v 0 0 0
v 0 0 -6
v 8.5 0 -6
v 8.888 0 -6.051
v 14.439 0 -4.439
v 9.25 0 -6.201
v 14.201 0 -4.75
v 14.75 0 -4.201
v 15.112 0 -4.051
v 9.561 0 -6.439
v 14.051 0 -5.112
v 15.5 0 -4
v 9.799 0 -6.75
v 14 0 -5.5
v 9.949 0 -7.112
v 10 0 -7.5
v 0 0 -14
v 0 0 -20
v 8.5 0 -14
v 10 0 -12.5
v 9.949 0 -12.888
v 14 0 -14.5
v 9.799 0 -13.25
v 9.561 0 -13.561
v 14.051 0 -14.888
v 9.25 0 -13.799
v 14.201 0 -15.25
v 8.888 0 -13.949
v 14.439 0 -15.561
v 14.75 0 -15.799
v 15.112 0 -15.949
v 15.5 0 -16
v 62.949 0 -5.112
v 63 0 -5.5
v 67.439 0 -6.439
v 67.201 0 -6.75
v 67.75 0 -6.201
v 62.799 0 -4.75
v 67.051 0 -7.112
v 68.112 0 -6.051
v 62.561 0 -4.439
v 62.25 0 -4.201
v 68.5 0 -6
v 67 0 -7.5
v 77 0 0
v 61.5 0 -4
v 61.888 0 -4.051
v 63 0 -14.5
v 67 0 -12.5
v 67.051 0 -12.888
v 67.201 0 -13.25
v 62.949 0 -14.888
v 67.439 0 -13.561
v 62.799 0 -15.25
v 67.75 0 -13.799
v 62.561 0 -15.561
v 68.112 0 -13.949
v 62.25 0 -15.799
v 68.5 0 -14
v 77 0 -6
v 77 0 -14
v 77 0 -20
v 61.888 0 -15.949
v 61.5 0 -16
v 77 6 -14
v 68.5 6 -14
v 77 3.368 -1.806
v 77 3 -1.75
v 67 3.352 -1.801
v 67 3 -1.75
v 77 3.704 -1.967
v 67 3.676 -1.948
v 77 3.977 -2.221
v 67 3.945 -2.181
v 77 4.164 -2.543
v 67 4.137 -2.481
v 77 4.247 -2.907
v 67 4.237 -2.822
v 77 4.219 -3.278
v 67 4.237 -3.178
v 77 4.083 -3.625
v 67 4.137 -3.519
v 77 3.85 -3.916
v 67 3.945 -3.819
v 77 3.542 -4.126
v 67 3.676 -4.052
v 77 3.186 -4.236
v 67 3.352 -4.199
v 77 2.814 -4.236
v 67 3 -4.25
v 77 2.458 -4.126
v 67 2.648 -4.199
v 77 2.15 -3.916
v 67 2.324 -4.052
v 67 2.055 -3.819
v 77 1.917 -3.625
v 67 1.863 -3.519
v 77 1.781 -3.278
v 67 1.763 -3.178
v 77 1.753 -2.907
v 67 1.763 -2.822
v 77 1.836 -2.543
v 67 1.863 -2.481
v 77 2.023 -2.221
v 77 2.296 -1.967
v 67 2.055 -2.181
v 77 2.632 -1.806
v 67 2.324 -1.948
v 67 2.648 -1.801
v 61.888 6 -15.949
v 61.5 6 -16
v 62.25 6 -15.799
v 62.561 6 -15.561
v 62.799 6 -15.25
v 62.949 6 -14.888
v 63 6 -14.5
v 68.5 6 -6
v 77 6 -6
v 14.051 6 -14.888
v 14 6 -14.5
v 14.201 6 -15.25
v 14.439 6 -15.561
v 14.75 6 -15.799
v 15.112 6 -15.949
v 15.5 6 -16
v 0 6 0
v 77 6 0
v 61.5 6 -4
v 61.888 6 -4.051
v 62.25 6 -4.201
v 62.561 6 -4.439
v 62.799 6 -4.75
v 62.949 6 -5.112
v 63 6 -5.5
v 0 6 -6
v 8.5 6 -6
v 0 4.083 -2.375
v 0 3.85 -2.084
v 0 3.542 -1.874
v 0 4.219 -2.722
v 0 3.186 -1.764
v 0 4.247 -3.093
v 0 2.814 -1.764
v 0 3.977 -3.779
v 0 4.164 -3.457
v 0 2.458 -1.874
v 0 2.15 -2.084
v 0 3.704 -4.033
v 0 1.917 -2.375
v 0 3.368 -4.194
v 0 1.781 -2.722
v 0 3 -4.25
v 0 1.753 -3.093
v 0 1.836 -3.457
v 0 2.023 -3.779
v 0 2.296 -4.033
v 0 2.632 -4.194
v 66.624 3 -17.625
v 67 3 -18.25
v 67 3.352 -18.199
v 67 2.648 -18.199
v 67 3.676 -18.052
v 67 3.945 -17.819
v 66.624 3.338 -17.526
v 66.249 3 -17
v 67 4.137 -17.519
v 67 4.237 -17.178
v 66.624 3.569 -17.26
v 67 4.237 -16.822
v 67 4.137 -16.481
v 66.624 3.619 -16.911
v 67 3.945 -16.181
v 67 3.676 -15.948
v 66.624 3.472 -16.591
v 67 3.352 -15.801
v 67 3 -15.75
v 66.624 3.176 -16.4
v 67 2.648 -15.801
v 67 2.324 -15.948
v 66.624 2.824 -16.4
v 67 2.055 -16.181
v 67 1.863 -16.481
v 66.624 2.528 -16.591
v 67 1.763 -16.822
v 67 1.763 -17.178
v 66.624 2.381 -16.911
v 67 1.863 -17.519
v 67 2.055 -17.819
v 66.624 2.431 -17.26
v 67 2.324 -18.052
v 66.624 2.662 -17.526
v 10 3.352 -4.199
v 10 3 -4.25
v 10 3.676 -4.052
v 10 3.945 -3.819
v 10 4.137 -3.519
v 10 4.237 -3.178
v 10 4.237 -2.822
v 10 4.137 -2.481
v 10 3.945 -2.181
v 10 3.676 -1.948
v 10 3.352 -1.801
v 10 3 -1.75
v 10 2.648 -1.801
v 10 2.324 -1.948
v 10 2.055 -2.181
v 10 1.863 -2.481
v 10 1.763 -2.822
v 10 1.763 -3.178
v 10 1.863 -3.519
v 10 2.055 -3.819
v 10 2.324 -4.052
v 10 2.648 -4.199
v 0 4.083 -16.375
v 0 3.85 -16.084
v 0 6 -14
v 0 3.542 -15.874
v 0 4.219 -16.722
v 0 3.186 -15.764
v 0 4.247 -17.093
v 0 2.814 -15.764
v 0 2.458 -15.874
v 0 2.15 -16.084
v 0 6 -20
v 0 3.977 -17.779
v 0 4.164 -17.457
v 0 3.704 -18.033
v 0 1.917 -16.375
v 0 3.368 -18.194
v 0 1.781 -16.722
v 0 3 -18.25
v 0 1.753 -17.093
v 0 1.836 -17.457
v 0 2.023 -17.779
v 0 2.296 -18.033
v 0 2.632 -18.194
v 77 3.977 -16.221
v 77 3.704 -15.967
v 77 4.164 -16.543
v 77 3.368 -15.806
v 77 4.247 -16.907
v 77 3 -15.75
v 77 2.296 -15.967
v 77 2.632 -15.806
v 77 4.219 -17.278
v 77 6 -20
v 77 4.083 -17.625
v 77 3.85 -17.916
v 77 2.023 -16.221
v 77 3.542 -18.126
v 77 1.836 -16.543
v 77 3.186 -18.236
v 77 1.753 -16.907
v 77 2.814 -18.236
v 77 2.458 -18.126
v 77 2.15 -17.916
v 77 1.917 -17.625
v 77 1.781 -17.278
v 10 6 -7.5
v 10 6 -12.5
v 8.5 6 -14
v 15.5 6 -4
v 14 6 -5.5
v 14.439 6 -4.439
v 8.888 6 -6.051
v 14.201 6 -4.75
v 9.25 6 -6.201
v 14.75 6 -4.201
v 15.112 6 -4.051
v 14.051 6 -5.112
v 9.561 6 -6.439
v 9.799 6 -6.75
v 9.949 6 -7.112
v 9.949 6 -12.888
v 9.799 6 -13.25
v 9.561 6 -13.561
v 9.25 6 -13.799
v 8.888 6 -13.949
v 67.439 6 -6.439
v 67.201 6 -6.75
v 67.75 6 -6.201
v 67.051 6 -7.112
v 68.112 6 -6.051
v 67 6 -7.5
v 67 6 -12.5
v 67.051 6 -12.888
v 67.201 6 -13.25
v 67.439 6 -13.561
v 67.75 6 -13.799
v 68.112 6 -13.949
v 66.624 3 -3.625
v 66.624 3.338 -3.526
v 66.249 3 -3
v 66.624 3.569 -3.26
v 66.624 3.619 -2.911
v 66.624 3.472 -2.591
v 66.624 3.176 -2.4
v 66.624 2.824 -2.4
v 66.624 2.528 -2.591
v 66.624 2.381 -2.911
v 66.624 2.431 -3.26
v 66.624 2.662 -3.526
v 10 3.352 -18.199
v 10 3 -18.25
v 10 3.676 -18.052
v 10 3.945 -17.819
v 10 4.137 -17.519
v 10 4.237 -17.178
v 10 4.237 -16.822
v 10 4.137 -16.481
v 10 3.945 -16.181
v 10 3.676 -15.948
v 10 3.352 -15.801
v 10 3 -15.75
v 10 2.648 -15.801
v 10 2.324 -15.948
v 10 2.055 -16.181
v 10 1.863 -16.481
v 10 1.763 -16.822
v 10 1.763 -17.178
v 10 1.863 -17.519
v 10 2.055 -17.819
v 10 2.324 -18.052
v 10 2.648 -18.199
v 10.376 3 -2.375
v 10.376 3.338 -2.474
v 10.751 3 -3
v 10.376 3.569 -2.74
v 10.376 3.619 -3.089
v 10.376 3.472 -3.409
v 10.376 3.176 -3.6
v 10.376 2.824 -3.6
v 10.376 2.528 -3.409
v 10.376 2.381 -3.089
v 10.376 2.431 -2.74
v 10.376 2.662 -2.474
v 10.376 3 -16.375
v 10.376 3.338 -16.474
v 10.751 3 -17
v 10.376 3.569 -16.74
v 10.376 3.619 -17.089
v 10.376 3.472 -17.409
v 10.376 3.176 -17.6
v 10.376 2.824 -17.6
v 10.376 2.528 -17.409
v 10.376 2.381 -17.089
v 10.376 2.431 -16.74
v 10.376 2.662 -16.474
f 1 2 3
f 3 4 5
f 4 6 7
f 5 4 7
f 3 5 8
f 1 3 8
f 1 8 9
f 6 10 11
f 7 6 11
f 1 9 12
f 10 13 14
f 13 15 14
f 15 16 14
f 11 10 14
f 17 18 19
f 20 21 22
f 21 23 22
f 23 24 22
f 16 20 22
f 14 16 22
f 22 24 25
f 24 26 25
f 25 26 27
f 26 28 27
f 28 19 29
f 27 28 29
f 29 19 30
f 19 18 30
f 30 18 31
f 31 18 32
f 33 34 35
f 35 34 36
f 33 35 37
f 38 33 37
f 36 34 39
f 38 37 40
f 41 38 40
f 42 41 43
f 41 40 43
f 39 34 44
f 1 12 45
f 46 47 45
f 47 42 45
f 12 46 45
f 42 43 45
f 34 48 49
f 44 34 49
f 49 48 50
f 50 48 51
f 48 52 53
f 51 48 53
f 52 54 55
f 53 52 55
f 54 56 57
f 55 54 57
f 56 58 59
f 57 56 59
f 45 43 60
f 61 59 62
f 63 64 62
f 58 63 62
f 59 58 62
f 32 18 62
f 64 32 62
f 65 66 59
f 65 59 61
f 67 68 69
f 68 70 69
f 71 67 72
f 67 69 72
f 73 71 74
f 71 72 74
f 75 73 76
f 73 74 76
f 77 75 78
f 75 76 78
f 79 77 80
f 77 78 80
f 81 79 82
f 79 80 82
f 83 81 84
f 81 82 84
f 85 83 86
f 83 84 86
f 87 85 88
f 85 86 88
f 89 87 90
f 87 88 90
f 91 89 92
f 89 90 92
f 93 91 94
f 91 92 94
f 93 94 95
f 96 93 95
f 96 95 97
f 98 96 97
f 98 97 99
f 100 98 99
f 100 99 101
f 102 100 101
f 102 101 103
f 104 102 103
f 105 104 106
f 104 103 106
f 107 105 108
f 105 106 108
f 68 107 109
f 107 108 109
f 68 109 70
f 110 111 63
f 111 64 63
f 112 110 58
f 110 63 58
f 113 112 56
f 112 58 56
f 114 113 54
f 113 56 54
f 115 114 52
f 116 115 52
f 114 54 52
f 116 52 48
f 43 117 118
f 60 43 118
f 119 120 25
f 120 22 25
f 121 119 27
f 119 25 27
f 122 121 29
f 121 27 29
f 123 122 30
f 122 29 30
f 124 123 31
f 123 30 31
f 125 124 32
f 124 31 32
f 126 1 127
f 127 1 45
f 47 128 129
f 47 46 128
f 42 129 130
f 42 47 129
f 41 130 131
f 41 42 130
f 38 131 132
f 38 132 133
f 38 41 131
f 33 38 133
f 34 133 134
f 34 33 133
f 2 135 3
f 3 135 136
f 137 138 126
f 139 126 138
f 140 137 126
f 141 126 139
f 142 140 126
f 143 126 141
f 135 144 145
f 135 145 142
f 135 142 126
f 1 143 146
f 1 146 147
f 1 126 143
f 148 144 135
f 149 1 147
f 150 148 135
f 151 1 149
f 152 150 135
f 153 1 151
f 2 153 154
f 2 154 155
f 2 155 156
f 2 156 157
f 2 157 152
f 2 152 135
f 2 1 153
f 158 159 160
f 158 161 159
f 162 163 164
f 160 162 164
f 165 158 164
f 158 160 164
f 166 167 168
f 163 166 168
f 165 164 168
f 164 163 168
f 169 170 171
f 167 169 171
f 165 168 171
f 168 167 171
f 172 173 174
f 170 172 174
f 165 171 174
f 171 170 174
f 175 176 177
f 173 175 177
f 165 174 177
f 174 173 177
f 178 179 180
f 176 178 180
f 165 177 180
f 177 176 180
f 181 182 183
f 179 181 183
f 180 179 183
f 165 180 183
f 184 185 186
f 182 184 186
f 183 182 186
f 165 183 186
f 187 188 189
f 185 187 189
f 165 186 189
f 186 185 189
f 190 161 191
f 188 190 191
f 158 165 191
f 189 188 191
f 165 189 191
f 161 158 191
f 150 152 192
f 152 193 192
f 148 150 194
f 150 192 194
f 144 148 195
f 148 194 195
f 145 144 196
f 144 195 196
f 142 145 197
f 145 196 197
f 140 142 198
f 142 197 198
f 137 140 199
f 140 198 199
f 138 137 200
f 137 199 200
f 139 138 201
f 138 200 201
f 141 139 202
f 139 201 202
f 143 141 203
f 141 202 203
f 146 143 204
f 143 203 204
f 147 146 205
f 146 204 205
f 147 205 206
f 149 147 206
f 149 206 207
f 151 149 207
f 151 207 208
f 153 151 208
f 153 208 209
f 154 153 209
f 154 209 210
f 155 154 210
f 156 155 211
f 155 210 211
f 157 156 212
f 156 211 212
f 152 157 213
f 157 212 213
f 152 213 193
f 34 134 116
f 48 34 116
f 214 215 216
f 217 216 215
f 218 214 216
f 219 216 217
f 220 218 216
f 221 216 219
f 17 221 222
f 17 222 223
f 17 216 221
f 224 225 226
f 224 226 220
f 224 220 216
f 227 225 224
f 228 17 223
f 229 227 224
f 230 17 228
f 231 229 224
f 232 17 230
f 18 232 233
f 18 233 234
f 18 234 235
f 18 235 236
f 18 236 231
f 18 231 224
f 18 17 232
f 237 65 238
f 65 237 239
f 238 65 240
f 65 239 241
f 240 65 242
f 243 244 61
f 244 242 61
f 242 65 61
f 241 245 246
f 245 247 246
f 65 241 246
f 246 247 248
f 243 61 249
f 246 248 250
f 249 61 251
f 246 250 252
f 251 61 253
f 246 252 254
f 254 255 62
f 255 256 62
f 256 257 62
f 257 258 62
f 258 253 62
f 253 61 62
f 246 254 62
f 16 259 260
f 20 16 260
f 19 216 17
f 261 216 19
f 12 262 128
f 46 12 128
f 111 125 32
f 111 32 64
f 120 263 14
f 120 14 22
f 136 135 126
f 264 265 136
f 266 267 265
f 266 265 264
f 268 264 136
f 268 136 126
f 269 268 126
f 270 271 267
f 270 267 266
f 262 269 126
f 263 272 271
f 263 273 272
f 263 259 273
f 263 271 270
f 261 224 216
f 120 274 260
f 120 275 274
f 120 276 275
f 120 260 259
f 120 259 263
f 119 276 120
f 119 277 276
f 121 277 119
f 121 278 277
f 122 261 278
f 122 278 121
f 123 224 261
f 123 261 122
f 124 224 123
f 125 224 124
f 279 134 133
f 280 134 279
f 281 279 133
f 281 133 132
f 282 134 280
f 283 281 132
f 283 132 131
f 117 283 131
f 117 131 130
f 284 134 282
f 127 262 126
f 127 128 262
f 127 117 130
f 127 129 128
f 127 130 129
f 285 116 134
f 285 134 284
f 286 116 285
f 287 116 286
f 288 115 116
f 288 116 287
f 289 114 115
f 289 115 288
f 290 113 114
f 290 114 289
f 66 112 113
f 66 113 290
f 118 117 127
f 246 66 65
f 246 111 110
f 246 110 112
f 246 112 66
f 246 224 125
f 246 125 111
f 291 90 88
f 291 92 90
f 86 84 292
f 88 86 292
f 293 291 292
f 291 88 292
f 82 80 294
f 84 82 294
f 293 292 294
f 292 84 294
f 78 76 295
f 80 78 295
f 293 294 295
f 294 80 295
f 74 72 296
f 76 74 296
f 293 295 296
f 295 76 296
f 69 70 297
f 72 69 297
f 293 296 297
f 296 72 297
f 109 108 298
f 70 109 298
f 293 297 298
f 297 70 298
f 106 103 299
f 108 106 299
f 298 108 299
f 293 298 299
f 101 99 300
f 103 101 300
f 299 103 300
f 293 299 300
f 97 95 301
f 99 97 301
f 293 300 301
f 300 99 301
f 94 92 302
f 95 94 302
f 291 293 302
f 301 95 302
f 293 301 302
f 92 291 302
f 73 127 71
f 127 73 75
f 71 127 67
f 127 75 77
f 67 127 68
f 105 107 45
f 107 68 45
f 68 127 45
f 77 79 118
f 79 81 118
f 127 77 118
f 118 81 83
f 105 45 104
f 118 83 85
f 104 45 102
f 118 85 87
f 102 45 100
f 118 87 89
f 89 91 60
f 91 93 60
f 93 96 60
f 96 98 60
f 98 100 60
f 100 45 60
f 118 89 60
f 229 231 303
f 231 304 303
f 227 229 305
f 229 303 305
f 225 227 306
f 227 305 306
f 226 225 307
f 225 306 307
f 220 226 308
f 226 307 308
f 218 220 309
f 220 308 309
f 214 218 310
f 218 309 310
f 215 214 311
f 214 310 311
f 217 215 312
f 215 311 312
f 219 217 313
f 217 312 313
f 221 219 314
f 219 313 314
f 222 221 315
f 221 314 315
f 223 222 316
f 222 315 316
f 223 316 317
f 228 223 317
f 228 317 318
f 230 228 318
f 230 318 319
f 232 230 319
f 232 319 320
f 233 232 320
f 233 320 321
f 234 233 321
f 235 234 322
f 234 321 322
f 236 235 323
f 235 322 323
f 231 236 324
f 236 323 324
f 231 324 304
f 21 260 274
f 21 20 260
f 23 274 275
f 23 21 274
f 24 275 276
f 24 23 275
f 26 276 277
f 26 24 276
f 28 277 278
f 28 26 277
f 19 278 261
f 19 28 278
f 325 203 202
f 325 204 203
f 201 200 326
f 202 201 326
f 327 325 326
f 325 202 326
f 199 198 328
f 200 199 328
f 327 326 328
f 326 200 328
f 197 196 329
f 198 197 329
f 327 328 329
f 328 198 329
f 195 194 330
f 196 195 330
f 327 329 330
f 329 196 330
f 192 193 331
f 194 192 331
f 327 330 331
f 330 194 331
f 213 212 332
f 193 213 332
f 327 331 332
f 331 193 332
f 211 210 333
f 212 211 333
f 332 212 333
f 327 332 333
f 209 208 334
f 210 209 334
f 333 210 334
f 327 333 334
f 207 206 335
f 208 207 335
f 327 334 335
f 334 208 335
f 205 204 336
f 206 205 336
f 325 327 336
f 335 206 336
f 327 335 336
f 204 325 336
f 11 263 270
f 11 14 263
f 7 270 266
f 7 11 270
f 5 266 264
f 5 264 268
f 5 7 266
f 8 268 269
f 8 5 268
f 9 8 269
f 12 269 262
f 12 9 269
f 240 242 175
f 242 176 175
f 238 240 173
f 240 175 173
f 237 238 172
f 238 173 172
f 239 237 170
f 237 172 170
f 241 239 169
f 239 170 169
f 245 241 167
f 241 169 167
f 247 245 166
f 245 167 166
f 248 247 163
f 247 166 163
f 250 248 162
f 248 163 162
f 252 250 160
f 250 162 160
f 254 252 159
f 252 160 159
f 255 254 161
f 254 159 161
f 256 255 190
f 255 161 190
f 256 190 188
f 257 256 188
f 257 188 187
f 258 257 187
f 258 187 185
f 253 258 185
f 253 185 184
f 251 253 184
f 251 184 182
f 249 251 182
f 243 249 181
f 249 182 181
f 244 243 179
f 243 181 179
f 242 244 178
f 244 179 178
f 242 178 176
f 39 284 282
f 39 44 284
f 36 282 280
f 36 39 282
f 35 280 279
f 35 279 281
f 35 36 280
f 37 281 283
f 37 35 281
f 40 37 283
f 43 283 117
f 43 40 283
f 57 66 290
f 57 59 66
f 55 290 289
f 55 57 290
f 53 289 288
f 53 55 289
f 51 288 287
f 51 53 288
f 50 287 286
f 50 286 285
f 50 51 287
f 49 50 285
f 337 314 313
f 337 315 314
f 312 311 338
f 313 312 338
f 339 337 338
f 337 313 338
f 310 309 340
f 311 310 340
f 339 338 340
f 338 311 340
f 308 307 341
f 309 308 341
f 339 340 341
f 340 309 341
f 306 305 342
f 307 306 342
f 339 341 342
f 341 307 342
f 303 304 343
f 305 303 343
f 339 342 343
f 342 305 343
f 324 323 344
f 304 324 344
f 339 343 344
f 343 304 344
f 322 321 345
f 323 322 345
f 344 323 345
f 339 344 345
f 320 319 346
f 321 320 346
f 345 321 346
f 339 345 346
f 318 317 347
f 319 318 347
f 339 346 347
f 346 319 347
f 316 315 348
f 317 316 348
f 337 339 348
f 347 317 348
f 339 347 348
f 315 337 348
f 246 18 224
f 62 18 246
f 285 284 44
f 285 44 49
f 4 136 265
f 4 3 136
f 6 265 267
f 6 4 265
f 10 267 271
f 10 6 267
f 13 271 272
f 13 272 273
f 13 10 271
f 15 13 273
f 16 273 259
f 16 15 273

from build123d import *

# Parameters (mm, degrees)
SKETCH1_W                   = 77
SKETCH1_H                   = 20
BOSS_EXTRUDE1_DEPTH         = 6
TAP_DRILL_FOR_M3_TAP1_D     = 2.5
TAP_DRILL_FOR_M3_TAP1_DEPTH = 10
TAP_DRILL_FOR_M3_TAP1_TIP   = 0.751075774
TAP_DRILL_FOR_M3_TAP2_D     = 2.5
TAP_DRILL_FOR_M3_TAP2_DEPTH = 10
TAP_DRILL_FOR_M3_TAP2_TIP   = 0.751075774
CUT_EXTRUDE1_REACH          = 81.781
SKETCH7_W                   = 10
SKETCH7_H                   = 8
SKETCH7_W_2                 = 49
SKETCH7_H_2                 = 12
FILLET1_R                   = 1.5


with BuildPart() as part:
    # Sketch1 → Boss-Extrude1 (new body)
    with BuildSketch(Plane(origin=(0, 0, 0), x_dir=(1, 0, 0), z_dir=(0, 1, 0))):
        with Locations((38.5, 10)):
            Rectangle(SKETCH1_W, SKETCH1_H)
    extrude(amount=BOSS_EXTRUDE1_DEPTH)

    # Tap Drill for M3 Tap1
    with Locations(Plane.ZY):
        with Locations((-17, 3), (-3, 3)):
            Hole(TAP_DRILL_FOR_M3_TAP1_D / 2, depth=TAP_DRILL_FOR_M3_TAP1_DEPTH)
            with Locations((0, 0, -(TAP_DRILL_FOR_M3_TAP1_DEPTH + TAP_DRILL_FOR_M3_TAP1_TIP / 2))):  # 118° drill point
                Cone(0, TAP_DRILL_FOR_M3_TAP1_D / 2, TAP_DRILL_FOR_M3_TAP1_TIP, mode=Mode.SUBTRACT)

    # Tap Drill for M3 Tap2
    with Locations(Plane(origin=(77, 0, 0), x_dir=(0, 0, -1), z_dir=(1, 0, 0))):
        with Locations((3, 3), (17, 3)):
            Hole(TAP_DRILL_FOR_M3_TAP2_D / 2, depth=TAP_DRILL_FOR_M3_TAP2_DEPTH)
            with Locations((0, 0, -(TAP_DRILL_FOR_M3_TAP2_DEPTH + TAP_DRILL_FOR_M3_TAP2_TIP / 2))):  # 118° drill point
                Cone(0, TAP_DRILL_FOR_M3_TAP2_D / 2, TAP_DRILL_FOR_M3_TAP2_TIP, mode=Mode.SUBTRACT)

    # Sketch7 → Cut-Extrude1 (cut, up to next)
    with BuildSketch(Plane(origin=(0, 6, 0), x_dir=(1, 0, 0), z_dir=(0, 1, 0)), mode=Mode.PRIVATE) as cut_extrude1_sk1:
        with Locations((5, 10)):
            Rectangle(SKETCH7_W, SKETCH7_H)
    cut_extrude1_tool1 = extrude(cut_extrude1_sk1.sketch, amount=-CUT_EXTRUDE1_REACH, mode=Mode.PRIVATE) & part.part
    # Sketch7 → Cut-Extrude1 (cut, up to next)
    with BuildSketch(Plane(origin=(0, 6, 0), x_dir=(1, 0, 0), z_dir=(0, 1, 0)), mode=Mode.PRIVATE) as cut_extrude1_sk2:
        with Locations((38.5, 10)):
            Rectangle(SKETCH7_W_2, SKETCH7_H_2)
    cut_extrude1_tool2 = extrude(cut_extrude1_sk2.sketch, amount=-CUT_EXTRUDE1_REACH, mode=Mode.PRIVATE) & part.part
    # Sketch7 → Cut-Extrude1 (cut, up to next)
    with BuildSketch(Plane(origin=(0, 6, 0), x_dir=(1, 0, 0), z_dir=(0, 1, 0)), mode=Mode.PRIVATE) as cut_extrude1_sk3:
        with Locations((72, 10)):
            Rectangle(SKETCH7_W, SKETCH7_H)
    cut_extrude1_tool3 = extrude(cut_extrude1_sk3.sketch, amount=-CUT_EXTRUDE1_REACH, mode=Mode.PRIVATE) & part.part
    add(cut_extrude1_tool1.solids().sort_by_distance((5, 6, -10))[0], mode=Mode.SUBTRACT)
    add(cut_extrude1_tool2.solids().sort_by_distance((38.5, 6, -10))[0], mode=Mode.SUBTRACT)
    add(cut_extrude1_tool3.solids().sort_by_distance((72, 6, -10))[0], mode=Mode.SUBTRACT)

    # Fillet1
    fillet1_edges = [part.edges().sort_by_distance(p)[0] for p in [
        (10, 3, -14),
        (10, 3, -6),
        (14, 3, -4),
        (14, 3, -16),
        (63, 3, -16),
        (63, 3, -4),
        (67, 3, -6),
        (67, 3, -14),
    ]]
    fillet(fillet1_edges, radius=FILLET1_R)


solid = part.part
